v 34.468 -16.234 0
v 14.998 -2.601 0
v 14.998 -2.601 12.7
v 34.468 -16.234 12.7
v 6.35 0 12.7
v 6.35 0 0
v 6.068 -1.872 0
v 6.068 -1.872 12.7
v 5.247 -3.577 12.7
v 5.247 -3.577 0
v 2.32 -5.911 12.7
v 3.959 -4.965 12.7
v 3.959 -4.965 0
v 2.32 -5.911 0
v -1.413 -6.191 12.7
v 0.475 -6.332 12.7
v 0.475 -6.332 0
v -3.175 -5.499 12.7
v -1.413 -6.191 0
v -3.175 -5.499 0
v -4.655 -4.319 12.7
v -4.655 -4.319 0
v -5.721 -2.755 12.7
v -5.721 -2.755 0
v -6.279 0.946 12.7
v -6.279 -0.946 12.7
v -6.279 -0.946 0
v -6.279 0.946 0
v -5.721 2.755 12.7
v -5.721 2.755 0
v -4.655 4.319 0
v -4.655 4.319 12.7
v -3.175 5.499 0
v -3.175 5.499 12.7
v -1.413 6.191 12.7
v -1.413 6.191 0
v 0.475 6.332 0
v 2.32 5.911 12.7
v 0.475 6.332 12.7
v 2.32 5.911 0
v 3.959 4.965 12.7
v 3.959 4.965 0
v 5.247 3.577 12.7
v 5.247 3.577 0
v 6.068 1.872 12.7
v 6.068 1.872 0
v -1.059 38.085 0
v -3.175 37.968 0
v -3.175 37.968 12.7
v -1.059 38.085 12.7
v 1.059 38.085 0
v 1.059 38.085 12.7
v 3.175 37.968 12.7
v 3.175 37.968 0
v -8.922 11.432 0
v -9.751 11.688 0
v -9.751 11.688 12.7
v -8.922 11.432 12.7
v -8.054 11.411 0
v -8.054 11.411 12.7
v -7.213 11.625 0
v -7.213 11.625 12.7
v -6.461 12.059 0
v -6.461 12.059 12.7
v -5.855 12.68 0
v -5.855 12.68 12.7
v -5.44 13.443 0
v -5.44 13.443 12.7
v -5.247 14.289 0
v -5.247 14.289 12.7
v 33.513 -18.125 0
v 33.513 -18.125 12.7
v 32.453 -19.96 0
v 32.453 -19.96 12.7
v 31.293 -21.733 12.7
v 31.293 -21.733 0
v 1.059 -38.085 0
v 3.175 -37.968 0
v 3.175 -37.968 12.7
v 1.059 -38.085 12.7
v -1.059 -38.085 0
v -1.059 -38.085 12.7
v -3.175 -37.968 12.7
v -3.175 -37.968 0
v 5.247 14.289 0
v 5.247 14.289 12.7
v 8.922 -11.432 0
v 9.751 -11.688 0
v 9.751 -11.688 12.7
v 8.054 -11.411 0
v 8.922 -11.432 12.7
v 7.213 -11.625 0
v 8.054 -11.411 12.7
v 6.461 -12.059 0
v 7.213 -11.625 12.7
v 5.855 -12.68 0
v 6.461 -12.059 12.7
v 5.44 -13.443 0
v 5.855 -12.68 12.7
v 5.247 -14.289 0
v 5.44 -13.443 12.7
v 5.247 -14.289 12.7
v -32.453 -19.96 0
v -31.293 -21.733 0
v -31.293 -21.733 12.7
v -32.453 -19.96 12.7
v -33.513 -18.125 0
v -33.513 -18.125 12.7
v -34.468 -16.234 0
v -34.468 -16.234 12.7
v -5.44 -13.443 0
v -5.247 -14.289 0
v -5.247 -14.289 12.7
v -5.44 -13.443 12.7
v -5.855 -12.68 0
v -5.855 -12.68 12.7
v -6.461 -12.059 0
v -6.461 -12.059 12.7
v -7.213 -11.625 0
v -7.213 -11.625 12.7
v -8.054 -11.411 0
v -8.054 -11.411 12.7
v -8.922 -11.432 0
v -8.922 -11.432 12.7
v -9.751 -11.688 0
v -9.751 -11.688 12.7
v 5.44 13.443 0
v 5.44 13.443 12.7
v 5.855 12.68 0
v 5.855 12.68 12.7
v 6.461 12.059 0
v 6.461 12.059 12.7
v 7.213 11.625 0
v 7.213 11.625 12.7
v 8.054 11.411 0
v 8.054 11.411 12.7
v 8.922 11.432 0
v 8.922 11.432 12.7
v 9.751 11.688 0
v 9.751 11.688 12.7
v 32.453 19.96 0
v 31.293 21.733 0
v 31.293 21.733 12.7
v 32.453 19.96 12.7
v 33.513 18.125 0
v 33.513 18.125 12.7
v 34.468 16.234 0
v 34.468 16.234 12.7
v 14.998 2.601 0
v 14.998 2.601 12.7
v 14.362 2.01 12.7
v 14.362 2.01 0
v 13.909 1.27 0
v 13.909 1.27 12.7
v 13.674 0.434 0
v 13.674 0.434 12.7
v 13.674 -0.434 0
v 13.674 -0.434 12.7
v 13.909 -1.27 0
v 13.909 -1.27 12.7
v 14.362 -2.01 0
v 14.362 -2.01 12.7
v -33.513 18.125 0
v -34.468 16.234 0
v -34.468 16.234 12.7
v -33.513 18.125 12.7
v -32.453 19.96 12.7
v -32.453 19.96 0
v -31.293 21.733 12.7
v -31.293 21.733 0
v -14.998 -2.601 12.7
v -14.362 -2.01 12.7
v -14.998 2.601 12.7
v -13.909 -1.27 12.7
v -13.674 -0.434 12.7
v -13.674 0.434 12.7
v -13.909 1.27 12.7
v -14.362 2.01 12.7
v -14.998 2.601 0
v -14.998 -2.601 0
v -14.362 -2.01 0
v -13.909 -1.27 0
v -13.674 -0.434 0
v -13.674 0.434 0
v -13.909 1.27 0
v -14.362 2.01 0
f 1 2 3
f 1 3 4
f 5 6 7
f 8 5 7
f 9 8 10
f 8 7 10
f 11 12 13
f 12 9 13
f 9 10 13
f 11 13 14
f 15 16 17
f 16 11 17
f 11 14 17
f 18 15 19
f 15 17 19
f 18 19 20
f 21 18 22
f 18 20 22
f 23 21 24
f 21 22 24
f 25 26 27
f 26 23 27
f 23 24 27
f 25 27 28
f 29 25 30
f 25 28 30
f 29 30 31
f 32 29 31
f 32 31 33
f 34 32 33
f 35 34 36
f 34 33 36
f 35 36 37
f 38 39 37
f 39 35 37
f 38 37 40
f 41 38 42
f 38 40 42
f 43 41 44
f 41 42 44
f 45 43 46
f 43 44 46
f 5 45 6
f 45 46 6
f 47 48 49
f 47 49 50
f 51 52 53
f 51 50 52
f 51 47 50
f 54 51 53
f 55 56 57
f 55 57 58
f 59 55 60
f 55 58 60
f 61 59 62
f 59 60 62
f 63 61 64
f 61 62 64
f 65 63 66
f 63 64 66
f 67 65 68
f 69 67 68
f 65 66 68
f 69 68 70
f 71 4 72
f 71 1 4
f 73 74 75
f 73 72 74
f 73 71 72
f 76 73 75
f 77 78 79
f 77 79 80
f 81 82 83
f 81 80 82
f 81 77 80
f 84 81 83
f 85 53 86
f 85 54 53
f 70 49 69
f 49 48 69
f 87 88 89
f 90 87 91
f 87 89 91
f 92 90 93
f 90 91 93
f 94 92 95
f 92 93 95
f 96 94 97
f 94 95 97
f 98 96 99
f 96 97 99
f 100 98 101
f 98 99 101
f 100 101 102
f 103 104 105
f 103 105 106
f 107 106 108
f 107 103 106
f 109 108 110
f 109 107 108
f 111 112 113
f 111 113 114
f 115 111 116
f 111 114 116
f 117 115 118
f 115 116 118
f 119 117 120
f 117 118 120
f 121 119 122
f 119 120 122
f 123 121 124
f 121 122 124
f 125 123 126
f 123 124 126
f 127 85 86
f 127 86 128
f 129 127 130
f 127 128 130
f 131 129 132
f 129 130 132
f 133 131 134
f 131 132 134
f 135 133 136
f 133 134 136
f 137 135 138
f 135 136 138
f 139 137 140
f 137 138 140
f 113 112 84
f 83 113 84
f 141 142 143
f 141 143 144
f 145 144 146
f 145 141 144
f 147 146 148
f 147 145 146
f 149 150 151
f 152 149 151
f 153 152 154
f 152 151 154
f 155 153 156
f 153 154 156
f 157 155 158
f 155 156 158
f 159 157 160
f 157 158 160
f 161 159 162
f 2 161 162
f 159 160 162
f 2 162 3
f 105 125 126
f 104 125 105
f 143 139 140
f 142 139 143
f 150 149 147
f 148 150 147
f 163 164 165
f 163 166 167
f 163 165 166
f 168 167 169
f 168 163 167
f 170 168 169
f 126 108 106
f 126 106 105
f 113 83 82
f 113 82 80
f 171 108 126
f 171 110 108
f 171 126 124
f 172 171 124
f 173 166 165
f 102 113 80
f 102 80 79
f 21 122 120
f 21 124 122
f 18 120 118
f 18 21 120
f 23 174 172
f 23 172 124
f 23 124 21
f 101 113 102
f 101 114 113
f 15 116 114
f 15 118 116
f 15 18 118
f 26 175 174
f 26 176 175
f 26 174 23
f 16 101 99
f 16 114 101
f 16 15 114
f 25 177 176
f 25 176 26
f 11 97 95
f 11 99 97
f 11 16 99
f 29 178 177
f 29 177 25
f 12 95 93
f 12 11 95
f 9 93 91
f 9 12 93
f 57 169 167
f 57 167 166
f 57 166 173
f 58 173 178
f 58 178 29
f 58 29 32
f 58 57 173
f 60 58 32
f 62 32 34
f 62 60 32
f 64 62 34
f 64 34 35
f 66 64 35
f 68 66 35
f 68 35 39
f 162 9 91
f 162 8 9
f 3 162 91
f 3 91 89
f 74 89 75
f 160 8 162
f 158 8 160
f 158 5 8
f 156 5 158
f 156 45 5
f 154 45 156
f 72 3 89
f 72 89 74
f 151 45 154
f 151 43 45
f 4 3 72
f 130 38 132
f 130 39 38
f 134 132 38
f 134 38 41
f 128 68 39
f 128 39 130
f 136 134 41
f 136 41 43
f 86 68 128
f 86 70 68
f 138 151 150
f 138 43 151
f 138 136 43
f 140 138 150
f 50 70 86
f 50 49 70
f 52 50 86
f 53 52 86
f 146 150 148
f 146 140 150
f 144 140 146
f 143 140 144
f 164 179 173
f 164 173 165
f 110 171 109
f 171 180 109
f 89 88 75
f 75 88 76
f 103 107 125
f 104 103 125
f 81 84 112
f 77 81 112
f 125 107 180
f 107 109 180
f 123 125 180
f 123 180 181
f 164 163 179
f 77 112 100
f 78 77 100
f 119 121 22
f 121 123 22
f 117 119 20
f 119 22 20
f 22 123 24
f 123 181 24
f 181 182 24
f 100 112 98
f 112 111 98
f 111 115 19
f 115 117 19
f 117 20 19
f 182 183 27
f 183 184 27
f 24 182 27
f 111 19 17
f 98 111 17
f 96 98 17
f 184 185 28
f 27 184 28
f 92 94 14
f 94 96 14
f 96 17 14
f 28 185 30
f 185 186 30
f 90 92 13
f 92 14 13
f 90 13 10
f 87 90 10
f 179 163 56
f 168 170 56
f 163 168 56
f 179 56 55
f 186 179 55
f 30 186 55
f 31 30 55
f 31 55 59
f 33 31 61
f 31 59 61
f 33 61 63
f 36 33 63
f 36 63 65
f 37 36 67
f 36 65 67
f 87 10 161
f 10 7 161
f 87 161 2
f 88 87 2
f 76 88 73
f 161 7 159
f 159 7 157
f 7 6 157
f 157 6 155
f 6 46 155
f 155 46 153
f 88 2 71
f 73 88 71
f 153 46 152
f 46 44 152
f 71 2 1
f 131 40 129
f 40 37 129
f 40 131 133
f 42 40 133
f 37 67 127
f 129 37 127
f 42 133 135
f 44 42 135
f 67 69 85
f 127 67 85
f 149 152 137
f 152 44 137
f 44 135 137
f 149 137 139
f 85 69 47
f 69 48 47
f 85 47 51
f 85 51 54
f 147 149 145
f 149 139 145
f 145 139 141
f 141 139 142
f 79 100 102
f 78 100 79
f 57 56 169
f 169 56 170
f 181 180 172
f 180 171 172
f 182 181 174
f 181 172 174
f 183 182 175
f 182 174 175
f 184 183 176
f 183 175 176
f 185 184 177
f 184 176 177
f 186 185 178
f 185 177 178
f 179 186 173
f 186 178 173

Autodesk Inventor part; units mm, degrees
ref_plane "YZ Plane" through (0, 0, 0) normal (1, 0, 0) x (0, 1, 0)
ref_plane "XZ Plane" through (0, 0, 0) normal (0, 1, 0) x (-1, 0, 0)
ref_plane "XY Plane" through (0, 0, 0) normal (0, 0, 1) x (1, 0, 0)
sketch "Sketch1" plane through (0, 0, 0) normal (0, 0, 1) x (1, 0, 0)
  arc A0 (3.175, 37.9675) -> (-3.175, 37.9675) centre (0, 0) ccw
  line L0 (-3.175, 37.9675) -> (-5.6418, 9.7719)
  line L1 (0, 38.1) -> (0, 0) construction
  arc A1 (-3.175, 37.9675) -> (-31.2933, 21.7334) centre (0, 0) ccw construction
  line L2 (-5.6418, 9.7719) -> (5.6418, 9.7719) construction
  line L3 (5.6418, 9.7719) -> (11.2836, 0) construction
  line L4 (11.2836, 0) -> (5.6418, -9.7719) construction
  line L5 (5.6418, -9.7719) -> (-5.6418, -9.7719) construction
  line L6 (-5.6418, -9.7719) -> (-11.2836, 0) construction
  line L7 (-11.2836, 0) -> (-5.6418, 9.7719) construction
  line L8 (3.175, 37.9675) -> (5.6418, 9.7719)
  line L9 (0, 0) -> (-32.9956, 19.05) construction
  line L10 (0, 0) -> (32.9956, 19.05) construction
  line L11 (0, 0) -> (-32.9956, -19.05) construction
  line L12 (0, 0) -> (32.9956, -19.05) construction
  line L13 (0, 0) -> (0, -38.1) construction
  line L14 (5.6418, 9.7719) -> (31.2933, 21.7334)
  line L15 (11.2836, 0) -> (34.4683, 16.2341)
  line L16 (11.2836, 0) -> (34.4683, -16.2341)
  line L17 (5.6418, -9.7719) -> (31.2933, -21.7334)
  arc A2 (31.2933, 21.7334) -> (3.175, 37.9675) centre (0, 0) ccw construction
  arc A3 (34.4683, 16.2341) -> (31.2933, 21.7334) centre (0, 0) ccw
  arc A4 (34.4683, -16.2341) -> (34.4683, 16.2341) centre (0, 0) ccw construction
  arc A5 (31.2933, -21.7334) -> (34.4683, -16.2341) centre (0, 0) ccw
  line L18 (5.6418, -9.7719) -> (3.175, -37.9675)
  line L19 (-5.6418, -9.7719) -> (-3.175, -37.9675)
  line L20 (-5.6418, -9.7719) -> (-31.2933, -21.7334)
  line L21 (-11.2836, 0) -> (-34.4683, -16.2341)
  line L22 (-11.2836, 0) -> (-34.4683, 16.2341)
  line L23 (-5.6418, 9.7719) -> (-31.2933, 21.7334)
  arc A6 (-31.2933, 21.7334) -> (-34.4683, 16.2341) centre (0, 0) ccw
  arc A7 (-34.4683, 16.2341) -> (-34.4683, -16.2341) centre (0, 0) ccw construction
  arc A8 (-34.4683, -16.2341) -> (-31.2933, -21.7334) centre (0, 0) ccw
  arc A9 (-31.2933, -21.7334) -> (-3.175, -37.9675) centre (0, 0) ccw construction
  arc A10 (-3.175, -37.9675) -> (3.175, -37.9675) centre (0, 0) ccw
  arc A11 (3.175, -37.9675) -> (31.2933, -21.7334) centre (0, 0) ccw construction
  circle A12 centre (0, 0) radius 6.35
  dimension "d10" = 38.1
  dimension "d1" = 6.35
  dimension "d2" = 3.175
  dimension "d3" = 5
  dimension "d5" = 5
  dimension "d6" = 5
  dimension "d7" = 5
  dimension "d8" = 5
  dimension "d9" = 5
  dimension "d13" = 12.7
extrude "Extrusion1" add sketch "Sketch1" along normal blind 12.7
fillet "Fillet1" radius 3.175 6 edges at (5.6418, 9.7719, 6.35) (-5.6418, 9.7719, 6.35) (-11.2836, 0, 6.35) (-5.6418, -9.7719, 6.35) (5.6418, -9.7719, 6.35) (11.2836, 0, 6.35)
equation "\"d2\" = 0.5 * d1"
equation "\"d5\" = d3"
equation "\"d6\" = d3"
equation "\"d8\" = d6"
equation "\"d9\" = d8"
properties part number "rubber intake star"
